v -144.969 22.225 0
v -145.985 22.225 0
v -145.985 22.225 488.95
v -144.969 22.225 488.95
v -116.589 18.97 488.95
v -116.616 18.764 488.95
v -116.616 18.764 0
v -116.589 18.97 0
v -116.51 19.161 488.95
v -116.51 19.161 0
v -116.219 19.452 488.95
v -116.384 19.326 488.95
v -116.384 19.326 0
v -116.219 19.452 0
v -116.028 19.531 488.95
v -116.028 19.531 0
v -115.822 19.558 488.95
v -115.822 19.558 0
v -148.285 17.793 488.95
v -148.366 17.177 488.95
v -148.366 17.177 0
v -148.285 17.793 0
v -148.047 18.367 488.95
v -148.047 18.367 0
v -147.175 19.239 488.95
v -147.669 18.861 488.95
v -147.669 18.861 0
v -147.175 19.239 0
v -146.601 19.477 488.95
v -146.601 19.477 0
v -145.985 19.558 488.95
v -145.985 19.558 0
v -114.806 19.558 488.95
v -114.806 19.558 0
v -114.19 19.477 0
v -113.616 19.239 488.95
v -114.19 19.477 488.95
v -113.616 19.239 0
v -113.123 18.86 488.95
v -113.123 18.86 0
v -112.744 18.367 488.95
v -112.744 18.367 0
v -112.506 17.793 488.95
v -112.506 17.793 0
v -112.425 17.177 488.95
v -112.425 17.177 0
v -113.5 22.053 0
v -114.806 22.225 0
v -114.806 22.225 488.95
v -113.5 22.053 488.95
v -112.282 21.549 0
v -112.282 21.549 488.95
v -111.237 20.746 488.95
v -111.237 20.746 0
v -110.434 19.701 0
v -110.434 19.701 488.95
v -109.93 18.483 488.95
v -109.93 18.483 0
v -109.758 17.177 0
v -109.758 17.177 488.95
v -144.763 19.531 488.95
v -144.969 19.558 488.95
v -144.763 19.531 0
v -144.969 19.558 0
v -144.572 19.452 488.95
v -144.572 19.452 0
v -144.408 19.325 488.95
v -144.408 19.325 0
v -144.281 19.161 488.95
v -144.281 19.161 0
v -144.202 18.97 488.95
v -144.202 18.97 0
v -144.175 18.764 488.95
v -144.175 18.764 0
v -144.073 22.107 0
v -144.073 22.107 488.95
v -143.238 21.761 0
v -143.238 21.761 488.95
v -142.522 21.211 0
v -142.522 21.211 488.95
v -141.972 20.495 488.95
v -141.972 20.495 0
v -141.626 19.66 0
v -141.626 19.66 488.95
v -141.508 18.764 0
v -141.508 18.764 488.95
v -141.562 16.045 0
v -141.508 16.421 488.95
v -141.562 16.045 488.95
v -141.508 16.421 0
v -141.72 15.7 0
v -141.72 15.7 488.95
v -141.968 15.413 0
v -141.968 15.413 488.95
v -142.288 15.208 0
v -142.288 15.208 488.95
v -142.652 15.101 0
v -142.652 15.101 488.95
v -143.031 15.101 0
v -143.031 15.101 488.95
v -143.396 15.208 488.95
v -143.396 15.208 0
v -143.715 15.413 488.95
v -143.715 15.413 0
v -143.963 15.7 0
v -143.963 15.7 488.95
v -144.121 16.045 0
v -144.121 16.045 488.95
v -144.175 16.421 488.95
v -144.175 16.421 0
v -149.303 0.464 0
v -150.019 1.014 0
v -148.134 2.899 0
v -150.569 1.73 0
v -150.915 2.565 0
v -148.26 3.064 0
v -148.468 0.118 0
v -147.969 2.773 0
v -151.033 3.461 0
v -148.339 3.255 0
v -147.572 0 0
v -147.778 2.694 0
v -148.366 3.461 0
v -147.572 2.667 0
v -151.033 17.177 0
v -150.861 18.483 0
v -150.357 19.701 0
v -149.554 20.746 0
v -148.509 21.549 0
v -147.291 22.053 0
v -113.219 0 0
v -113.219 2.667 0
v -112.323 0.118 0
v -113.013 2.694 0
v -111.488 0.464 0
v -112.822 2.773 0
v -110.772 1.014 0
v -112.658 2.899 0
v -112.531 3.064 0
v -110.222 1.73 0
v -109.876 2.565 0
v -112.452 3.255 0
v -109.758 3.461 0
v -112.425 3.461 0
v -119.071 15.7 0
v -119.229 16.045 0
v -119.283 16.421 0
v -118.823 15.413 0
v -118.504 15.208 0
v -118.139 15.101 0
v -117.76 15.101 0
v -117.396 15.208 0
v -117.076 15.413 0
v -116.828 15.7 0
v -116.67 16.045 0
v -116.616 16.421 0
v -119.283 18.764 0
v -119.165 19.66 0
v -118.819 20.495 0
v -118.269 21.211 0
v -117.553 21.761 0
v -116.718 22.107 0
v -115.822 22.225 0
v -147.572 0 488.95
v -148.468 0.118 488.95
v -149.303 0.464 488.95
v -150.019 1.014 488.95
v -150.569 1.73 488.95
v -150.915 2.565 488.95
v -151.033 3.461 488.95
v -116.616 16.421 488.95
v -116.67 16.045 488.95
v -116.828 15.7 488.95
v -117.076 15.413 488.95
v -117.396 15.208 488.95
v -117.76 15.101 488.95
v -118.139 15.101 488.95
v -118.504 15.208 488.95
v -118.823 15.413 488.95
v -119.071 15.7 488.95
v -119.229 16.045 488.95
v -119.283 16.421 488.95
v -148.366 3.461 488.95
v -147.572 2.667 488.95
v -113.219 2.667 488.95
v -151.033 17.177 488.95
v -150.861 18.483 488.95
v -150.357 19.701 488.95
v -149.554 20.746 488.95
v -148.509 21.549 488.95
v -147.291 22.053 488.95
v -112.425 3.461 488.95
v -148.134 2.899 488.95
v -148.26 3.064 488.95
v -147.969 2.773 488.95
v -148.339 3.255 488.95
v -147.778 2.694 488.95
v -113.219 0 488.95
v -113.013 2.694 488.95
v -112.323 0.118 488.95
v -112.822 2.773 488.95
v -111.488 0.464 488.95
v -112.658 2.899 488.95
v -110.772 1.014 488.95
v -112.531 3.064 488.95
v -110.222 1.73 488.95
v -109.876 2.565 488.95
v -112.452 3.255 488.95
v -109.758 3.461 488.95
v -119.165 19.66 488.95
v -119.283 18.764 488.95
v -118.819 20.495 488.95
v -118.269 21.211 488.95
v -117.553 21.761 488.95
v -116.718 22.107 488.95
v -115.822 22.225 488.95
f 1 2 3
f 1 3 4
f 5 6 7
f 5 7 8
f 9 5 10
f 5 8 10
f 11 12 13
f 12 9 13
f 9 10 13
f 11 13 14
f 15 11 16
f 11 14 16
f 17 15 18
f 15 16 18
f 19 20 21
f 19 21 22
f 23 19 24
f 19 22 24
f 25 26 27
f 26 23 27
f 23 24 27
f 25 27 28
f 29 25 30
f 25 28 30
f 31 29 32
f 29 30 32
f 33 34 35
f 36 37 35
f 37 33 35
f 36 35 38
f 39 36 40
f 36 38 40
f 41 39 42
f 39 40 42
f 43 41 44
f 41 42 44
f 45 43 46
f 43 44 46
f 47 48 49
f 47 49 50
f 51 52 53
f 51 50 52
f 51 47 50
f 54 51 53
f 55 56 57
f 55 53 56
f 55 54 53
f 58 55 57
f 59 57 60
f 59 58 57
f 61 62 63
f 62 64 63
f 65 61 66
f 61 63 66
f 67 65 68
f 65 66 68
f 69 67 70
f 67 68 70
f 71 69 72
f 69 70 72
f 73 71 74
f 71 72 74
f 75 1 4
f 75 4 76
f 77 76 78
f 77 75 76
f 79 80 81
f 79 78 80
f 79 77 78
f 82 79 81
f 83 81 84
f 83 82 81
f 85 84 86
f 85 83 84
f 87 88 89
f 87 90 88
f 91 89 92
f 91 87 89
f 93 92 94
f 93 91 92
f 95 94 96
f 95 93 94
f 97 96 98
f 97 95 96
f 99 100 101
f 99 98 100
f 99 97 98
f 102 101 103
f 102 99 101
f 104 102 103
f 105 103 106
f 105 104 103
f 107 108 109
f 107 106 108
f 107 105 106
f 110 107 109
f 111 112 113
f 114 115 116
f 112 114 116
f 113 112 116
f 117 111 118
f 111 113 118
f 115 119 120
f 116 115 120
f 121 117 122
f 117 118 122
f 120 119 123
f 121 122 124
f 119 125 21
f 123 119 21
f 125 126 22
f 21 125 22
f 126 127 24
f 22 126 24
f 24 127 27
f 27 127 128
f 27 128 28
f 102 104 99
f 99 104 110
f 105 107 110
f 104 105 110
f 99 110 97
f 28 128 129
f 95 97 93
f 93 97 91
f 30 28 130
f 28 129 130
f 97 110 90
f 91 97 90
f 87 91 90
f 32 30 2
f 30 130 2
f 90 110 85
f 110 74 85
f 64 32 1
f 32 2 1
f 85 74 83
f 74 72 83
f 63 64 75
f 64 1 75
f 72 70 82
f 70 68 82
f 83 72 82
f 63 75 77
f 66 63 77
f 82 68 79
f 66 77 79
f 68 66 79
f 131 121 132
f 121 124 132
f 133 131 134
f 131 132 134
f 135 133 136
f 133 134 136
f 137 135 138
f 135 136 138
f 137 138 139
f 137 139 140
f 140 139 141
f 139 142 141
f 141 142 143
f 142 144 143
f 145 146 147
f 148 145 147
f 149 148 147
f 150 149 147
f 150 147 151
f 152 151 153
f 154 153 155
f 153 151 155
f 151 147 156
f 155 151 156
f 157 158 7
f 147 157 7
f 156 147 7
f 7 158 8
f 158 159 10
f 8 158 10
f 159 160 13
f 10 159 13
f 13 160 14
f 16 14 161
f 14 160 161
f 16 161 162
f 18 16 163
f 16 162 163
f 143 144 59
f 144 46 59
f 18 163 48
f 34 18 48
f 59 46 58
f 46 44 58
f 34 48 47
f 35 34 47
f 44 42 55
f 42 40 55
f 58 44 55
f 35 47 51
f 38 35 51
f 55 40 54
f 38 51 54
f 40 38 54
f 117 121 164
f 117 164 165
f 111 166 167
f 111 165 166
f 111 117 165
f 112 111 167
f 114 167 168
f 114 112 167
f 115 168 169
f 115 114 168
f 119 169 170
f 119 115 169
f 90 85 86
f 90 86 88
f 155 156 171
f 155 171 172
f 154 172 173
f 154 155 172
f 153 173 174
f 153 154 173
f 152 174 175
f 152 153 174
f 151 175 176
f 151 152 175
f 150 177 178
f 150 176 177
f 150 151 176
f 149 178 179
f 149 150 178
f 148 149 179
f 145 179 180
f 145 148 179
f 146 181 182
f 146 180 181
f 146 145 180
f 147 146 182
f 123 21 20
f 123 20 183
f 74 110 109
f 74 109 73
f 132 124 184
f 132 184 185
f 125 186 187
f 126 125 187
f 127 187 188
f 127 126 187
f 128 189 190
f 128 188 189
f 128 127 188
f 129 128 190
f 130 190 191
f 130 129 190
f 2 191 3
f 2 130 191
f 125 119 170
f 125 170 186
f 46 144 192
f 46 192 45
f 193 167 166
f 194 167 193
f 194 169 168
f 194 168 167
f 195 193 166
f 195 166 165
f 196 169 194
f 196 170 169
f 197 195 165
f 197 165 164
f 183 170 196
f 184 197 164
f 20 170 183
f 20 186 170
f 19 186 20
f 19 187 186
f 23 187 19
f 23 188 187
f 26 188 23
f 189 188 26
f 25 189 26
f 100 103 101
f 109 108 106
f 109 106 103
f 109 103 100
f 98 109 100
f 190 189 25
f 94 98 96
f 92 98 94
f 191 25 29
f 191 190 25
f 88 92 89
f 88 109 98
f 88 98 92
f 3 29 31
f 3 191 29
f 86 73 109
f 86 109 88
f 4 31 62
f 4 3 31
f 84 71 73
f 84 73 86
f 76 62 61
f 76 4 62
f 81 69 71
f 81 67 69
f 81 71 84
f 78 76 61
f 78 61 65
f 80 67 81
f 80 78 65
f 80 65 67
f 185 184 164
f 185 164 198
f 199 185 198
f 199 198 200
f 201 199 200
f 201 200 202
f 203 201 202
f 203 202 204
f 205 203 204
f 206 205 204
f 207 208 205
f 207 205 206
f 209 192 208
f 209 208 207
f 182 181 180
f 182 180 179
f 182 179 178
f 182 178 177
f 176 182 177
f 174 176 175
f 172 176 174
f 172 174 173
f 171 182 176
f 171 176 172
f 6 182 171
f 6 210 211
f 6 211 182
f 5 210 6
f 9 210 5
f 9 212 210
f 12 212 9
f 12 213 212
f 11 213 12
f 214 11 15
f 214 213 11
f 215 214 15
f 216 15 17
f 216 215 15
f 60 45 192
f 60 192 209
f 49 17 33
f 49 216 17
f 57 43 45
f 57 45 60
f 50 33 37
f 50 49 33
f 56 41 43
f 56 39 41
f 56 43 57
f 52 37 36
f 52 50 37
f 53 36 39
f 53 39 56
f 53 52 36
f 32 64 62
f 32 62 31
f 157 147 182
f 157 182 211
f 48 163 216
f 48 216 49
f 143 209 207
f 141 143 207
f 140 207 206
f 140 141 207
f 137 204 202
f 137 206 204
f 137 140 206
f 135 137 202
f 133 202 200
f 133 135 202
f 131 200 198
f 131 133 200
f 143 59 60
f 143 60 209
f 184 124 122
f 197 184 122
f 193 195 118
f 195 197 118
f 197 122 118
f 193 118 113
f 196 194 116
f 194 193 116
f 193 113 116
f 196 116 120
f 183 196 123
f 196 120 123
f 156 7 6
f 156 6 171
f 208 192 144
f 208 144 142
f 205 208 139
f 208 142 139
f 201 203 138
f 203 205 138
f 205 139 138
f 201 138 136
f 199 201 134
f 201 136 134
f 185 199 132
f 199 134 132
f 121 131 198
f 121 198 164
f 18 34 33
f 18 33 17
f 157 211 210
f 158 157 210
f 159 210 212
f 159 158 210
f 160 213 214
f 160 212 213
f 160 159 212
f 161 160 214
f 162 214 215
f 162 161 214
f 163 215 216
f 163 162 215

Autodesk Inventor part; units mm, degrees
ref_plane "YZ Plane" through (0, 0, 0) normal (1, 0, 0) x (0, 1, 0)
ref_plane "Work Plane1" through (0, 0, 0) normal (0, 0, 1) x (1, 0, 0)
sketch "Sketch1" plane through (0, 0, 0) normal (0, 0, 1) x (1, 0, 0)
  arc A0 (-113.2188, 0) -> (-109.7581, 3.4607) centre (-113.2188, 3.4607) ccw projected
  line L0 (-109.7581, 17.1767) -> (-109.7581, 3.4607) projected
  arc A1 (-109.7581, 17.1767) -> (-114.8063, 22.225) centre (-114.8063, 17.1767) ccw projected
  line L1 (-115.8223, 22.225) -> (-114.8063, 22.225) projected
  arc A2 (-115.8223, 22.225) -> (-119.2831, 18.7642) centre (-115.8223, 18.7642) ccw projected
  line L2 (-119.2831, 16.4211) -> (-119.2831, 18.7642) projected
  arc A3 (-119.2831, 16.4211) -> (-116.6161, 16.4211) centre (-117.9496, 16.4211) ccw projected
  line L3 (-116.6161, 18.7642) -> (-116.6161, 16.4211) projected
  arc A4 (-115.8223, 19.558) -> (-116.6161, 18.7642) centre (-115.8223, 18.7642) ccw projected
  line L4 (-114.8063, 19.558) -> (-115.8223, 19.558) projected
  arc A5 (-112.4251, 17.1767) -> (-114.8063, 19.558) centre (-114.8063, 17.1767) ccw projected
  line L5 (-112.4251, 3.4607) -> (-112.4251, 17.1767) projected
  arc A6 (-113.2188, 2.667) -> (-112.4251, 3.4607) centre (-113.2188, 3.4607) ccw projected
  line L6 (-147.5723, 2.667) -> (-113.2188, 2.667) projected
  arc A7 (-148.3661, 3.4607) -> (-147.5723, 2.667) centre (-147.5723, 3.4607) ccw projected
  line L7 (-148.3661, 17.1767) -> (-148.3661, 3.4607) projected
  arc A8 (-145.9848, 19.558) -> (-148.3661, 17.1767) centre (-145.9848, 17.1767) ccw projected
  line L8 (-144.9688, 19.558) -> (-145.9848, 19.558) projected
  arc A9 (-144.1751, 18.7642) -> (-144.9688, 19.558) centre (-144.9688, 18.7642) ccw projected
  line L9 (-144.1751, 16.4211) -> (-144.1751, 18.7642) projected
  arc A10 (-144.1751, 16.4211) -> (-141.5081, 16.4211) centre (-142.8416, 16.4211) ccw projected
  line L10 (-141.5081, 18.7642) -> (-141.5081, 16.4211) projected
  arc A11 (-141.5081, 18.7642) -> (-144.9688, 22.225) centre (-144.9688, 18.7642) ccw projected
  line L11 (-145.9848, 22.225) -> (-144.9688, 22.225) projected
  arc A12 (-145.9848, 22.225) -> (-151.0331, 17.1767) centre (-145.9848, 17.1767) ccw projected
  line L12 (-151.0331, 3.4607) -> (-151.0331, 17.1767) projected
  arc A13 (-151.0331, 3.4607) -> (-147.5723, 0) centre (-147.5723, 3.4607) ccw projected
  line L13 (-113.2188, 0) -> (-147.5723, 0) projected
  point P0 (0, 0)
extrude "Extrusion1" add sketch "Sketch1" along normal blind 488.95
ref_plane "Work Plane2" through (0, 0, 244.475) normal (0, 0, 1) x (1, 0, 0)
properties part number "Horizontal-Unistrut-Tower-Connector-19-25"
